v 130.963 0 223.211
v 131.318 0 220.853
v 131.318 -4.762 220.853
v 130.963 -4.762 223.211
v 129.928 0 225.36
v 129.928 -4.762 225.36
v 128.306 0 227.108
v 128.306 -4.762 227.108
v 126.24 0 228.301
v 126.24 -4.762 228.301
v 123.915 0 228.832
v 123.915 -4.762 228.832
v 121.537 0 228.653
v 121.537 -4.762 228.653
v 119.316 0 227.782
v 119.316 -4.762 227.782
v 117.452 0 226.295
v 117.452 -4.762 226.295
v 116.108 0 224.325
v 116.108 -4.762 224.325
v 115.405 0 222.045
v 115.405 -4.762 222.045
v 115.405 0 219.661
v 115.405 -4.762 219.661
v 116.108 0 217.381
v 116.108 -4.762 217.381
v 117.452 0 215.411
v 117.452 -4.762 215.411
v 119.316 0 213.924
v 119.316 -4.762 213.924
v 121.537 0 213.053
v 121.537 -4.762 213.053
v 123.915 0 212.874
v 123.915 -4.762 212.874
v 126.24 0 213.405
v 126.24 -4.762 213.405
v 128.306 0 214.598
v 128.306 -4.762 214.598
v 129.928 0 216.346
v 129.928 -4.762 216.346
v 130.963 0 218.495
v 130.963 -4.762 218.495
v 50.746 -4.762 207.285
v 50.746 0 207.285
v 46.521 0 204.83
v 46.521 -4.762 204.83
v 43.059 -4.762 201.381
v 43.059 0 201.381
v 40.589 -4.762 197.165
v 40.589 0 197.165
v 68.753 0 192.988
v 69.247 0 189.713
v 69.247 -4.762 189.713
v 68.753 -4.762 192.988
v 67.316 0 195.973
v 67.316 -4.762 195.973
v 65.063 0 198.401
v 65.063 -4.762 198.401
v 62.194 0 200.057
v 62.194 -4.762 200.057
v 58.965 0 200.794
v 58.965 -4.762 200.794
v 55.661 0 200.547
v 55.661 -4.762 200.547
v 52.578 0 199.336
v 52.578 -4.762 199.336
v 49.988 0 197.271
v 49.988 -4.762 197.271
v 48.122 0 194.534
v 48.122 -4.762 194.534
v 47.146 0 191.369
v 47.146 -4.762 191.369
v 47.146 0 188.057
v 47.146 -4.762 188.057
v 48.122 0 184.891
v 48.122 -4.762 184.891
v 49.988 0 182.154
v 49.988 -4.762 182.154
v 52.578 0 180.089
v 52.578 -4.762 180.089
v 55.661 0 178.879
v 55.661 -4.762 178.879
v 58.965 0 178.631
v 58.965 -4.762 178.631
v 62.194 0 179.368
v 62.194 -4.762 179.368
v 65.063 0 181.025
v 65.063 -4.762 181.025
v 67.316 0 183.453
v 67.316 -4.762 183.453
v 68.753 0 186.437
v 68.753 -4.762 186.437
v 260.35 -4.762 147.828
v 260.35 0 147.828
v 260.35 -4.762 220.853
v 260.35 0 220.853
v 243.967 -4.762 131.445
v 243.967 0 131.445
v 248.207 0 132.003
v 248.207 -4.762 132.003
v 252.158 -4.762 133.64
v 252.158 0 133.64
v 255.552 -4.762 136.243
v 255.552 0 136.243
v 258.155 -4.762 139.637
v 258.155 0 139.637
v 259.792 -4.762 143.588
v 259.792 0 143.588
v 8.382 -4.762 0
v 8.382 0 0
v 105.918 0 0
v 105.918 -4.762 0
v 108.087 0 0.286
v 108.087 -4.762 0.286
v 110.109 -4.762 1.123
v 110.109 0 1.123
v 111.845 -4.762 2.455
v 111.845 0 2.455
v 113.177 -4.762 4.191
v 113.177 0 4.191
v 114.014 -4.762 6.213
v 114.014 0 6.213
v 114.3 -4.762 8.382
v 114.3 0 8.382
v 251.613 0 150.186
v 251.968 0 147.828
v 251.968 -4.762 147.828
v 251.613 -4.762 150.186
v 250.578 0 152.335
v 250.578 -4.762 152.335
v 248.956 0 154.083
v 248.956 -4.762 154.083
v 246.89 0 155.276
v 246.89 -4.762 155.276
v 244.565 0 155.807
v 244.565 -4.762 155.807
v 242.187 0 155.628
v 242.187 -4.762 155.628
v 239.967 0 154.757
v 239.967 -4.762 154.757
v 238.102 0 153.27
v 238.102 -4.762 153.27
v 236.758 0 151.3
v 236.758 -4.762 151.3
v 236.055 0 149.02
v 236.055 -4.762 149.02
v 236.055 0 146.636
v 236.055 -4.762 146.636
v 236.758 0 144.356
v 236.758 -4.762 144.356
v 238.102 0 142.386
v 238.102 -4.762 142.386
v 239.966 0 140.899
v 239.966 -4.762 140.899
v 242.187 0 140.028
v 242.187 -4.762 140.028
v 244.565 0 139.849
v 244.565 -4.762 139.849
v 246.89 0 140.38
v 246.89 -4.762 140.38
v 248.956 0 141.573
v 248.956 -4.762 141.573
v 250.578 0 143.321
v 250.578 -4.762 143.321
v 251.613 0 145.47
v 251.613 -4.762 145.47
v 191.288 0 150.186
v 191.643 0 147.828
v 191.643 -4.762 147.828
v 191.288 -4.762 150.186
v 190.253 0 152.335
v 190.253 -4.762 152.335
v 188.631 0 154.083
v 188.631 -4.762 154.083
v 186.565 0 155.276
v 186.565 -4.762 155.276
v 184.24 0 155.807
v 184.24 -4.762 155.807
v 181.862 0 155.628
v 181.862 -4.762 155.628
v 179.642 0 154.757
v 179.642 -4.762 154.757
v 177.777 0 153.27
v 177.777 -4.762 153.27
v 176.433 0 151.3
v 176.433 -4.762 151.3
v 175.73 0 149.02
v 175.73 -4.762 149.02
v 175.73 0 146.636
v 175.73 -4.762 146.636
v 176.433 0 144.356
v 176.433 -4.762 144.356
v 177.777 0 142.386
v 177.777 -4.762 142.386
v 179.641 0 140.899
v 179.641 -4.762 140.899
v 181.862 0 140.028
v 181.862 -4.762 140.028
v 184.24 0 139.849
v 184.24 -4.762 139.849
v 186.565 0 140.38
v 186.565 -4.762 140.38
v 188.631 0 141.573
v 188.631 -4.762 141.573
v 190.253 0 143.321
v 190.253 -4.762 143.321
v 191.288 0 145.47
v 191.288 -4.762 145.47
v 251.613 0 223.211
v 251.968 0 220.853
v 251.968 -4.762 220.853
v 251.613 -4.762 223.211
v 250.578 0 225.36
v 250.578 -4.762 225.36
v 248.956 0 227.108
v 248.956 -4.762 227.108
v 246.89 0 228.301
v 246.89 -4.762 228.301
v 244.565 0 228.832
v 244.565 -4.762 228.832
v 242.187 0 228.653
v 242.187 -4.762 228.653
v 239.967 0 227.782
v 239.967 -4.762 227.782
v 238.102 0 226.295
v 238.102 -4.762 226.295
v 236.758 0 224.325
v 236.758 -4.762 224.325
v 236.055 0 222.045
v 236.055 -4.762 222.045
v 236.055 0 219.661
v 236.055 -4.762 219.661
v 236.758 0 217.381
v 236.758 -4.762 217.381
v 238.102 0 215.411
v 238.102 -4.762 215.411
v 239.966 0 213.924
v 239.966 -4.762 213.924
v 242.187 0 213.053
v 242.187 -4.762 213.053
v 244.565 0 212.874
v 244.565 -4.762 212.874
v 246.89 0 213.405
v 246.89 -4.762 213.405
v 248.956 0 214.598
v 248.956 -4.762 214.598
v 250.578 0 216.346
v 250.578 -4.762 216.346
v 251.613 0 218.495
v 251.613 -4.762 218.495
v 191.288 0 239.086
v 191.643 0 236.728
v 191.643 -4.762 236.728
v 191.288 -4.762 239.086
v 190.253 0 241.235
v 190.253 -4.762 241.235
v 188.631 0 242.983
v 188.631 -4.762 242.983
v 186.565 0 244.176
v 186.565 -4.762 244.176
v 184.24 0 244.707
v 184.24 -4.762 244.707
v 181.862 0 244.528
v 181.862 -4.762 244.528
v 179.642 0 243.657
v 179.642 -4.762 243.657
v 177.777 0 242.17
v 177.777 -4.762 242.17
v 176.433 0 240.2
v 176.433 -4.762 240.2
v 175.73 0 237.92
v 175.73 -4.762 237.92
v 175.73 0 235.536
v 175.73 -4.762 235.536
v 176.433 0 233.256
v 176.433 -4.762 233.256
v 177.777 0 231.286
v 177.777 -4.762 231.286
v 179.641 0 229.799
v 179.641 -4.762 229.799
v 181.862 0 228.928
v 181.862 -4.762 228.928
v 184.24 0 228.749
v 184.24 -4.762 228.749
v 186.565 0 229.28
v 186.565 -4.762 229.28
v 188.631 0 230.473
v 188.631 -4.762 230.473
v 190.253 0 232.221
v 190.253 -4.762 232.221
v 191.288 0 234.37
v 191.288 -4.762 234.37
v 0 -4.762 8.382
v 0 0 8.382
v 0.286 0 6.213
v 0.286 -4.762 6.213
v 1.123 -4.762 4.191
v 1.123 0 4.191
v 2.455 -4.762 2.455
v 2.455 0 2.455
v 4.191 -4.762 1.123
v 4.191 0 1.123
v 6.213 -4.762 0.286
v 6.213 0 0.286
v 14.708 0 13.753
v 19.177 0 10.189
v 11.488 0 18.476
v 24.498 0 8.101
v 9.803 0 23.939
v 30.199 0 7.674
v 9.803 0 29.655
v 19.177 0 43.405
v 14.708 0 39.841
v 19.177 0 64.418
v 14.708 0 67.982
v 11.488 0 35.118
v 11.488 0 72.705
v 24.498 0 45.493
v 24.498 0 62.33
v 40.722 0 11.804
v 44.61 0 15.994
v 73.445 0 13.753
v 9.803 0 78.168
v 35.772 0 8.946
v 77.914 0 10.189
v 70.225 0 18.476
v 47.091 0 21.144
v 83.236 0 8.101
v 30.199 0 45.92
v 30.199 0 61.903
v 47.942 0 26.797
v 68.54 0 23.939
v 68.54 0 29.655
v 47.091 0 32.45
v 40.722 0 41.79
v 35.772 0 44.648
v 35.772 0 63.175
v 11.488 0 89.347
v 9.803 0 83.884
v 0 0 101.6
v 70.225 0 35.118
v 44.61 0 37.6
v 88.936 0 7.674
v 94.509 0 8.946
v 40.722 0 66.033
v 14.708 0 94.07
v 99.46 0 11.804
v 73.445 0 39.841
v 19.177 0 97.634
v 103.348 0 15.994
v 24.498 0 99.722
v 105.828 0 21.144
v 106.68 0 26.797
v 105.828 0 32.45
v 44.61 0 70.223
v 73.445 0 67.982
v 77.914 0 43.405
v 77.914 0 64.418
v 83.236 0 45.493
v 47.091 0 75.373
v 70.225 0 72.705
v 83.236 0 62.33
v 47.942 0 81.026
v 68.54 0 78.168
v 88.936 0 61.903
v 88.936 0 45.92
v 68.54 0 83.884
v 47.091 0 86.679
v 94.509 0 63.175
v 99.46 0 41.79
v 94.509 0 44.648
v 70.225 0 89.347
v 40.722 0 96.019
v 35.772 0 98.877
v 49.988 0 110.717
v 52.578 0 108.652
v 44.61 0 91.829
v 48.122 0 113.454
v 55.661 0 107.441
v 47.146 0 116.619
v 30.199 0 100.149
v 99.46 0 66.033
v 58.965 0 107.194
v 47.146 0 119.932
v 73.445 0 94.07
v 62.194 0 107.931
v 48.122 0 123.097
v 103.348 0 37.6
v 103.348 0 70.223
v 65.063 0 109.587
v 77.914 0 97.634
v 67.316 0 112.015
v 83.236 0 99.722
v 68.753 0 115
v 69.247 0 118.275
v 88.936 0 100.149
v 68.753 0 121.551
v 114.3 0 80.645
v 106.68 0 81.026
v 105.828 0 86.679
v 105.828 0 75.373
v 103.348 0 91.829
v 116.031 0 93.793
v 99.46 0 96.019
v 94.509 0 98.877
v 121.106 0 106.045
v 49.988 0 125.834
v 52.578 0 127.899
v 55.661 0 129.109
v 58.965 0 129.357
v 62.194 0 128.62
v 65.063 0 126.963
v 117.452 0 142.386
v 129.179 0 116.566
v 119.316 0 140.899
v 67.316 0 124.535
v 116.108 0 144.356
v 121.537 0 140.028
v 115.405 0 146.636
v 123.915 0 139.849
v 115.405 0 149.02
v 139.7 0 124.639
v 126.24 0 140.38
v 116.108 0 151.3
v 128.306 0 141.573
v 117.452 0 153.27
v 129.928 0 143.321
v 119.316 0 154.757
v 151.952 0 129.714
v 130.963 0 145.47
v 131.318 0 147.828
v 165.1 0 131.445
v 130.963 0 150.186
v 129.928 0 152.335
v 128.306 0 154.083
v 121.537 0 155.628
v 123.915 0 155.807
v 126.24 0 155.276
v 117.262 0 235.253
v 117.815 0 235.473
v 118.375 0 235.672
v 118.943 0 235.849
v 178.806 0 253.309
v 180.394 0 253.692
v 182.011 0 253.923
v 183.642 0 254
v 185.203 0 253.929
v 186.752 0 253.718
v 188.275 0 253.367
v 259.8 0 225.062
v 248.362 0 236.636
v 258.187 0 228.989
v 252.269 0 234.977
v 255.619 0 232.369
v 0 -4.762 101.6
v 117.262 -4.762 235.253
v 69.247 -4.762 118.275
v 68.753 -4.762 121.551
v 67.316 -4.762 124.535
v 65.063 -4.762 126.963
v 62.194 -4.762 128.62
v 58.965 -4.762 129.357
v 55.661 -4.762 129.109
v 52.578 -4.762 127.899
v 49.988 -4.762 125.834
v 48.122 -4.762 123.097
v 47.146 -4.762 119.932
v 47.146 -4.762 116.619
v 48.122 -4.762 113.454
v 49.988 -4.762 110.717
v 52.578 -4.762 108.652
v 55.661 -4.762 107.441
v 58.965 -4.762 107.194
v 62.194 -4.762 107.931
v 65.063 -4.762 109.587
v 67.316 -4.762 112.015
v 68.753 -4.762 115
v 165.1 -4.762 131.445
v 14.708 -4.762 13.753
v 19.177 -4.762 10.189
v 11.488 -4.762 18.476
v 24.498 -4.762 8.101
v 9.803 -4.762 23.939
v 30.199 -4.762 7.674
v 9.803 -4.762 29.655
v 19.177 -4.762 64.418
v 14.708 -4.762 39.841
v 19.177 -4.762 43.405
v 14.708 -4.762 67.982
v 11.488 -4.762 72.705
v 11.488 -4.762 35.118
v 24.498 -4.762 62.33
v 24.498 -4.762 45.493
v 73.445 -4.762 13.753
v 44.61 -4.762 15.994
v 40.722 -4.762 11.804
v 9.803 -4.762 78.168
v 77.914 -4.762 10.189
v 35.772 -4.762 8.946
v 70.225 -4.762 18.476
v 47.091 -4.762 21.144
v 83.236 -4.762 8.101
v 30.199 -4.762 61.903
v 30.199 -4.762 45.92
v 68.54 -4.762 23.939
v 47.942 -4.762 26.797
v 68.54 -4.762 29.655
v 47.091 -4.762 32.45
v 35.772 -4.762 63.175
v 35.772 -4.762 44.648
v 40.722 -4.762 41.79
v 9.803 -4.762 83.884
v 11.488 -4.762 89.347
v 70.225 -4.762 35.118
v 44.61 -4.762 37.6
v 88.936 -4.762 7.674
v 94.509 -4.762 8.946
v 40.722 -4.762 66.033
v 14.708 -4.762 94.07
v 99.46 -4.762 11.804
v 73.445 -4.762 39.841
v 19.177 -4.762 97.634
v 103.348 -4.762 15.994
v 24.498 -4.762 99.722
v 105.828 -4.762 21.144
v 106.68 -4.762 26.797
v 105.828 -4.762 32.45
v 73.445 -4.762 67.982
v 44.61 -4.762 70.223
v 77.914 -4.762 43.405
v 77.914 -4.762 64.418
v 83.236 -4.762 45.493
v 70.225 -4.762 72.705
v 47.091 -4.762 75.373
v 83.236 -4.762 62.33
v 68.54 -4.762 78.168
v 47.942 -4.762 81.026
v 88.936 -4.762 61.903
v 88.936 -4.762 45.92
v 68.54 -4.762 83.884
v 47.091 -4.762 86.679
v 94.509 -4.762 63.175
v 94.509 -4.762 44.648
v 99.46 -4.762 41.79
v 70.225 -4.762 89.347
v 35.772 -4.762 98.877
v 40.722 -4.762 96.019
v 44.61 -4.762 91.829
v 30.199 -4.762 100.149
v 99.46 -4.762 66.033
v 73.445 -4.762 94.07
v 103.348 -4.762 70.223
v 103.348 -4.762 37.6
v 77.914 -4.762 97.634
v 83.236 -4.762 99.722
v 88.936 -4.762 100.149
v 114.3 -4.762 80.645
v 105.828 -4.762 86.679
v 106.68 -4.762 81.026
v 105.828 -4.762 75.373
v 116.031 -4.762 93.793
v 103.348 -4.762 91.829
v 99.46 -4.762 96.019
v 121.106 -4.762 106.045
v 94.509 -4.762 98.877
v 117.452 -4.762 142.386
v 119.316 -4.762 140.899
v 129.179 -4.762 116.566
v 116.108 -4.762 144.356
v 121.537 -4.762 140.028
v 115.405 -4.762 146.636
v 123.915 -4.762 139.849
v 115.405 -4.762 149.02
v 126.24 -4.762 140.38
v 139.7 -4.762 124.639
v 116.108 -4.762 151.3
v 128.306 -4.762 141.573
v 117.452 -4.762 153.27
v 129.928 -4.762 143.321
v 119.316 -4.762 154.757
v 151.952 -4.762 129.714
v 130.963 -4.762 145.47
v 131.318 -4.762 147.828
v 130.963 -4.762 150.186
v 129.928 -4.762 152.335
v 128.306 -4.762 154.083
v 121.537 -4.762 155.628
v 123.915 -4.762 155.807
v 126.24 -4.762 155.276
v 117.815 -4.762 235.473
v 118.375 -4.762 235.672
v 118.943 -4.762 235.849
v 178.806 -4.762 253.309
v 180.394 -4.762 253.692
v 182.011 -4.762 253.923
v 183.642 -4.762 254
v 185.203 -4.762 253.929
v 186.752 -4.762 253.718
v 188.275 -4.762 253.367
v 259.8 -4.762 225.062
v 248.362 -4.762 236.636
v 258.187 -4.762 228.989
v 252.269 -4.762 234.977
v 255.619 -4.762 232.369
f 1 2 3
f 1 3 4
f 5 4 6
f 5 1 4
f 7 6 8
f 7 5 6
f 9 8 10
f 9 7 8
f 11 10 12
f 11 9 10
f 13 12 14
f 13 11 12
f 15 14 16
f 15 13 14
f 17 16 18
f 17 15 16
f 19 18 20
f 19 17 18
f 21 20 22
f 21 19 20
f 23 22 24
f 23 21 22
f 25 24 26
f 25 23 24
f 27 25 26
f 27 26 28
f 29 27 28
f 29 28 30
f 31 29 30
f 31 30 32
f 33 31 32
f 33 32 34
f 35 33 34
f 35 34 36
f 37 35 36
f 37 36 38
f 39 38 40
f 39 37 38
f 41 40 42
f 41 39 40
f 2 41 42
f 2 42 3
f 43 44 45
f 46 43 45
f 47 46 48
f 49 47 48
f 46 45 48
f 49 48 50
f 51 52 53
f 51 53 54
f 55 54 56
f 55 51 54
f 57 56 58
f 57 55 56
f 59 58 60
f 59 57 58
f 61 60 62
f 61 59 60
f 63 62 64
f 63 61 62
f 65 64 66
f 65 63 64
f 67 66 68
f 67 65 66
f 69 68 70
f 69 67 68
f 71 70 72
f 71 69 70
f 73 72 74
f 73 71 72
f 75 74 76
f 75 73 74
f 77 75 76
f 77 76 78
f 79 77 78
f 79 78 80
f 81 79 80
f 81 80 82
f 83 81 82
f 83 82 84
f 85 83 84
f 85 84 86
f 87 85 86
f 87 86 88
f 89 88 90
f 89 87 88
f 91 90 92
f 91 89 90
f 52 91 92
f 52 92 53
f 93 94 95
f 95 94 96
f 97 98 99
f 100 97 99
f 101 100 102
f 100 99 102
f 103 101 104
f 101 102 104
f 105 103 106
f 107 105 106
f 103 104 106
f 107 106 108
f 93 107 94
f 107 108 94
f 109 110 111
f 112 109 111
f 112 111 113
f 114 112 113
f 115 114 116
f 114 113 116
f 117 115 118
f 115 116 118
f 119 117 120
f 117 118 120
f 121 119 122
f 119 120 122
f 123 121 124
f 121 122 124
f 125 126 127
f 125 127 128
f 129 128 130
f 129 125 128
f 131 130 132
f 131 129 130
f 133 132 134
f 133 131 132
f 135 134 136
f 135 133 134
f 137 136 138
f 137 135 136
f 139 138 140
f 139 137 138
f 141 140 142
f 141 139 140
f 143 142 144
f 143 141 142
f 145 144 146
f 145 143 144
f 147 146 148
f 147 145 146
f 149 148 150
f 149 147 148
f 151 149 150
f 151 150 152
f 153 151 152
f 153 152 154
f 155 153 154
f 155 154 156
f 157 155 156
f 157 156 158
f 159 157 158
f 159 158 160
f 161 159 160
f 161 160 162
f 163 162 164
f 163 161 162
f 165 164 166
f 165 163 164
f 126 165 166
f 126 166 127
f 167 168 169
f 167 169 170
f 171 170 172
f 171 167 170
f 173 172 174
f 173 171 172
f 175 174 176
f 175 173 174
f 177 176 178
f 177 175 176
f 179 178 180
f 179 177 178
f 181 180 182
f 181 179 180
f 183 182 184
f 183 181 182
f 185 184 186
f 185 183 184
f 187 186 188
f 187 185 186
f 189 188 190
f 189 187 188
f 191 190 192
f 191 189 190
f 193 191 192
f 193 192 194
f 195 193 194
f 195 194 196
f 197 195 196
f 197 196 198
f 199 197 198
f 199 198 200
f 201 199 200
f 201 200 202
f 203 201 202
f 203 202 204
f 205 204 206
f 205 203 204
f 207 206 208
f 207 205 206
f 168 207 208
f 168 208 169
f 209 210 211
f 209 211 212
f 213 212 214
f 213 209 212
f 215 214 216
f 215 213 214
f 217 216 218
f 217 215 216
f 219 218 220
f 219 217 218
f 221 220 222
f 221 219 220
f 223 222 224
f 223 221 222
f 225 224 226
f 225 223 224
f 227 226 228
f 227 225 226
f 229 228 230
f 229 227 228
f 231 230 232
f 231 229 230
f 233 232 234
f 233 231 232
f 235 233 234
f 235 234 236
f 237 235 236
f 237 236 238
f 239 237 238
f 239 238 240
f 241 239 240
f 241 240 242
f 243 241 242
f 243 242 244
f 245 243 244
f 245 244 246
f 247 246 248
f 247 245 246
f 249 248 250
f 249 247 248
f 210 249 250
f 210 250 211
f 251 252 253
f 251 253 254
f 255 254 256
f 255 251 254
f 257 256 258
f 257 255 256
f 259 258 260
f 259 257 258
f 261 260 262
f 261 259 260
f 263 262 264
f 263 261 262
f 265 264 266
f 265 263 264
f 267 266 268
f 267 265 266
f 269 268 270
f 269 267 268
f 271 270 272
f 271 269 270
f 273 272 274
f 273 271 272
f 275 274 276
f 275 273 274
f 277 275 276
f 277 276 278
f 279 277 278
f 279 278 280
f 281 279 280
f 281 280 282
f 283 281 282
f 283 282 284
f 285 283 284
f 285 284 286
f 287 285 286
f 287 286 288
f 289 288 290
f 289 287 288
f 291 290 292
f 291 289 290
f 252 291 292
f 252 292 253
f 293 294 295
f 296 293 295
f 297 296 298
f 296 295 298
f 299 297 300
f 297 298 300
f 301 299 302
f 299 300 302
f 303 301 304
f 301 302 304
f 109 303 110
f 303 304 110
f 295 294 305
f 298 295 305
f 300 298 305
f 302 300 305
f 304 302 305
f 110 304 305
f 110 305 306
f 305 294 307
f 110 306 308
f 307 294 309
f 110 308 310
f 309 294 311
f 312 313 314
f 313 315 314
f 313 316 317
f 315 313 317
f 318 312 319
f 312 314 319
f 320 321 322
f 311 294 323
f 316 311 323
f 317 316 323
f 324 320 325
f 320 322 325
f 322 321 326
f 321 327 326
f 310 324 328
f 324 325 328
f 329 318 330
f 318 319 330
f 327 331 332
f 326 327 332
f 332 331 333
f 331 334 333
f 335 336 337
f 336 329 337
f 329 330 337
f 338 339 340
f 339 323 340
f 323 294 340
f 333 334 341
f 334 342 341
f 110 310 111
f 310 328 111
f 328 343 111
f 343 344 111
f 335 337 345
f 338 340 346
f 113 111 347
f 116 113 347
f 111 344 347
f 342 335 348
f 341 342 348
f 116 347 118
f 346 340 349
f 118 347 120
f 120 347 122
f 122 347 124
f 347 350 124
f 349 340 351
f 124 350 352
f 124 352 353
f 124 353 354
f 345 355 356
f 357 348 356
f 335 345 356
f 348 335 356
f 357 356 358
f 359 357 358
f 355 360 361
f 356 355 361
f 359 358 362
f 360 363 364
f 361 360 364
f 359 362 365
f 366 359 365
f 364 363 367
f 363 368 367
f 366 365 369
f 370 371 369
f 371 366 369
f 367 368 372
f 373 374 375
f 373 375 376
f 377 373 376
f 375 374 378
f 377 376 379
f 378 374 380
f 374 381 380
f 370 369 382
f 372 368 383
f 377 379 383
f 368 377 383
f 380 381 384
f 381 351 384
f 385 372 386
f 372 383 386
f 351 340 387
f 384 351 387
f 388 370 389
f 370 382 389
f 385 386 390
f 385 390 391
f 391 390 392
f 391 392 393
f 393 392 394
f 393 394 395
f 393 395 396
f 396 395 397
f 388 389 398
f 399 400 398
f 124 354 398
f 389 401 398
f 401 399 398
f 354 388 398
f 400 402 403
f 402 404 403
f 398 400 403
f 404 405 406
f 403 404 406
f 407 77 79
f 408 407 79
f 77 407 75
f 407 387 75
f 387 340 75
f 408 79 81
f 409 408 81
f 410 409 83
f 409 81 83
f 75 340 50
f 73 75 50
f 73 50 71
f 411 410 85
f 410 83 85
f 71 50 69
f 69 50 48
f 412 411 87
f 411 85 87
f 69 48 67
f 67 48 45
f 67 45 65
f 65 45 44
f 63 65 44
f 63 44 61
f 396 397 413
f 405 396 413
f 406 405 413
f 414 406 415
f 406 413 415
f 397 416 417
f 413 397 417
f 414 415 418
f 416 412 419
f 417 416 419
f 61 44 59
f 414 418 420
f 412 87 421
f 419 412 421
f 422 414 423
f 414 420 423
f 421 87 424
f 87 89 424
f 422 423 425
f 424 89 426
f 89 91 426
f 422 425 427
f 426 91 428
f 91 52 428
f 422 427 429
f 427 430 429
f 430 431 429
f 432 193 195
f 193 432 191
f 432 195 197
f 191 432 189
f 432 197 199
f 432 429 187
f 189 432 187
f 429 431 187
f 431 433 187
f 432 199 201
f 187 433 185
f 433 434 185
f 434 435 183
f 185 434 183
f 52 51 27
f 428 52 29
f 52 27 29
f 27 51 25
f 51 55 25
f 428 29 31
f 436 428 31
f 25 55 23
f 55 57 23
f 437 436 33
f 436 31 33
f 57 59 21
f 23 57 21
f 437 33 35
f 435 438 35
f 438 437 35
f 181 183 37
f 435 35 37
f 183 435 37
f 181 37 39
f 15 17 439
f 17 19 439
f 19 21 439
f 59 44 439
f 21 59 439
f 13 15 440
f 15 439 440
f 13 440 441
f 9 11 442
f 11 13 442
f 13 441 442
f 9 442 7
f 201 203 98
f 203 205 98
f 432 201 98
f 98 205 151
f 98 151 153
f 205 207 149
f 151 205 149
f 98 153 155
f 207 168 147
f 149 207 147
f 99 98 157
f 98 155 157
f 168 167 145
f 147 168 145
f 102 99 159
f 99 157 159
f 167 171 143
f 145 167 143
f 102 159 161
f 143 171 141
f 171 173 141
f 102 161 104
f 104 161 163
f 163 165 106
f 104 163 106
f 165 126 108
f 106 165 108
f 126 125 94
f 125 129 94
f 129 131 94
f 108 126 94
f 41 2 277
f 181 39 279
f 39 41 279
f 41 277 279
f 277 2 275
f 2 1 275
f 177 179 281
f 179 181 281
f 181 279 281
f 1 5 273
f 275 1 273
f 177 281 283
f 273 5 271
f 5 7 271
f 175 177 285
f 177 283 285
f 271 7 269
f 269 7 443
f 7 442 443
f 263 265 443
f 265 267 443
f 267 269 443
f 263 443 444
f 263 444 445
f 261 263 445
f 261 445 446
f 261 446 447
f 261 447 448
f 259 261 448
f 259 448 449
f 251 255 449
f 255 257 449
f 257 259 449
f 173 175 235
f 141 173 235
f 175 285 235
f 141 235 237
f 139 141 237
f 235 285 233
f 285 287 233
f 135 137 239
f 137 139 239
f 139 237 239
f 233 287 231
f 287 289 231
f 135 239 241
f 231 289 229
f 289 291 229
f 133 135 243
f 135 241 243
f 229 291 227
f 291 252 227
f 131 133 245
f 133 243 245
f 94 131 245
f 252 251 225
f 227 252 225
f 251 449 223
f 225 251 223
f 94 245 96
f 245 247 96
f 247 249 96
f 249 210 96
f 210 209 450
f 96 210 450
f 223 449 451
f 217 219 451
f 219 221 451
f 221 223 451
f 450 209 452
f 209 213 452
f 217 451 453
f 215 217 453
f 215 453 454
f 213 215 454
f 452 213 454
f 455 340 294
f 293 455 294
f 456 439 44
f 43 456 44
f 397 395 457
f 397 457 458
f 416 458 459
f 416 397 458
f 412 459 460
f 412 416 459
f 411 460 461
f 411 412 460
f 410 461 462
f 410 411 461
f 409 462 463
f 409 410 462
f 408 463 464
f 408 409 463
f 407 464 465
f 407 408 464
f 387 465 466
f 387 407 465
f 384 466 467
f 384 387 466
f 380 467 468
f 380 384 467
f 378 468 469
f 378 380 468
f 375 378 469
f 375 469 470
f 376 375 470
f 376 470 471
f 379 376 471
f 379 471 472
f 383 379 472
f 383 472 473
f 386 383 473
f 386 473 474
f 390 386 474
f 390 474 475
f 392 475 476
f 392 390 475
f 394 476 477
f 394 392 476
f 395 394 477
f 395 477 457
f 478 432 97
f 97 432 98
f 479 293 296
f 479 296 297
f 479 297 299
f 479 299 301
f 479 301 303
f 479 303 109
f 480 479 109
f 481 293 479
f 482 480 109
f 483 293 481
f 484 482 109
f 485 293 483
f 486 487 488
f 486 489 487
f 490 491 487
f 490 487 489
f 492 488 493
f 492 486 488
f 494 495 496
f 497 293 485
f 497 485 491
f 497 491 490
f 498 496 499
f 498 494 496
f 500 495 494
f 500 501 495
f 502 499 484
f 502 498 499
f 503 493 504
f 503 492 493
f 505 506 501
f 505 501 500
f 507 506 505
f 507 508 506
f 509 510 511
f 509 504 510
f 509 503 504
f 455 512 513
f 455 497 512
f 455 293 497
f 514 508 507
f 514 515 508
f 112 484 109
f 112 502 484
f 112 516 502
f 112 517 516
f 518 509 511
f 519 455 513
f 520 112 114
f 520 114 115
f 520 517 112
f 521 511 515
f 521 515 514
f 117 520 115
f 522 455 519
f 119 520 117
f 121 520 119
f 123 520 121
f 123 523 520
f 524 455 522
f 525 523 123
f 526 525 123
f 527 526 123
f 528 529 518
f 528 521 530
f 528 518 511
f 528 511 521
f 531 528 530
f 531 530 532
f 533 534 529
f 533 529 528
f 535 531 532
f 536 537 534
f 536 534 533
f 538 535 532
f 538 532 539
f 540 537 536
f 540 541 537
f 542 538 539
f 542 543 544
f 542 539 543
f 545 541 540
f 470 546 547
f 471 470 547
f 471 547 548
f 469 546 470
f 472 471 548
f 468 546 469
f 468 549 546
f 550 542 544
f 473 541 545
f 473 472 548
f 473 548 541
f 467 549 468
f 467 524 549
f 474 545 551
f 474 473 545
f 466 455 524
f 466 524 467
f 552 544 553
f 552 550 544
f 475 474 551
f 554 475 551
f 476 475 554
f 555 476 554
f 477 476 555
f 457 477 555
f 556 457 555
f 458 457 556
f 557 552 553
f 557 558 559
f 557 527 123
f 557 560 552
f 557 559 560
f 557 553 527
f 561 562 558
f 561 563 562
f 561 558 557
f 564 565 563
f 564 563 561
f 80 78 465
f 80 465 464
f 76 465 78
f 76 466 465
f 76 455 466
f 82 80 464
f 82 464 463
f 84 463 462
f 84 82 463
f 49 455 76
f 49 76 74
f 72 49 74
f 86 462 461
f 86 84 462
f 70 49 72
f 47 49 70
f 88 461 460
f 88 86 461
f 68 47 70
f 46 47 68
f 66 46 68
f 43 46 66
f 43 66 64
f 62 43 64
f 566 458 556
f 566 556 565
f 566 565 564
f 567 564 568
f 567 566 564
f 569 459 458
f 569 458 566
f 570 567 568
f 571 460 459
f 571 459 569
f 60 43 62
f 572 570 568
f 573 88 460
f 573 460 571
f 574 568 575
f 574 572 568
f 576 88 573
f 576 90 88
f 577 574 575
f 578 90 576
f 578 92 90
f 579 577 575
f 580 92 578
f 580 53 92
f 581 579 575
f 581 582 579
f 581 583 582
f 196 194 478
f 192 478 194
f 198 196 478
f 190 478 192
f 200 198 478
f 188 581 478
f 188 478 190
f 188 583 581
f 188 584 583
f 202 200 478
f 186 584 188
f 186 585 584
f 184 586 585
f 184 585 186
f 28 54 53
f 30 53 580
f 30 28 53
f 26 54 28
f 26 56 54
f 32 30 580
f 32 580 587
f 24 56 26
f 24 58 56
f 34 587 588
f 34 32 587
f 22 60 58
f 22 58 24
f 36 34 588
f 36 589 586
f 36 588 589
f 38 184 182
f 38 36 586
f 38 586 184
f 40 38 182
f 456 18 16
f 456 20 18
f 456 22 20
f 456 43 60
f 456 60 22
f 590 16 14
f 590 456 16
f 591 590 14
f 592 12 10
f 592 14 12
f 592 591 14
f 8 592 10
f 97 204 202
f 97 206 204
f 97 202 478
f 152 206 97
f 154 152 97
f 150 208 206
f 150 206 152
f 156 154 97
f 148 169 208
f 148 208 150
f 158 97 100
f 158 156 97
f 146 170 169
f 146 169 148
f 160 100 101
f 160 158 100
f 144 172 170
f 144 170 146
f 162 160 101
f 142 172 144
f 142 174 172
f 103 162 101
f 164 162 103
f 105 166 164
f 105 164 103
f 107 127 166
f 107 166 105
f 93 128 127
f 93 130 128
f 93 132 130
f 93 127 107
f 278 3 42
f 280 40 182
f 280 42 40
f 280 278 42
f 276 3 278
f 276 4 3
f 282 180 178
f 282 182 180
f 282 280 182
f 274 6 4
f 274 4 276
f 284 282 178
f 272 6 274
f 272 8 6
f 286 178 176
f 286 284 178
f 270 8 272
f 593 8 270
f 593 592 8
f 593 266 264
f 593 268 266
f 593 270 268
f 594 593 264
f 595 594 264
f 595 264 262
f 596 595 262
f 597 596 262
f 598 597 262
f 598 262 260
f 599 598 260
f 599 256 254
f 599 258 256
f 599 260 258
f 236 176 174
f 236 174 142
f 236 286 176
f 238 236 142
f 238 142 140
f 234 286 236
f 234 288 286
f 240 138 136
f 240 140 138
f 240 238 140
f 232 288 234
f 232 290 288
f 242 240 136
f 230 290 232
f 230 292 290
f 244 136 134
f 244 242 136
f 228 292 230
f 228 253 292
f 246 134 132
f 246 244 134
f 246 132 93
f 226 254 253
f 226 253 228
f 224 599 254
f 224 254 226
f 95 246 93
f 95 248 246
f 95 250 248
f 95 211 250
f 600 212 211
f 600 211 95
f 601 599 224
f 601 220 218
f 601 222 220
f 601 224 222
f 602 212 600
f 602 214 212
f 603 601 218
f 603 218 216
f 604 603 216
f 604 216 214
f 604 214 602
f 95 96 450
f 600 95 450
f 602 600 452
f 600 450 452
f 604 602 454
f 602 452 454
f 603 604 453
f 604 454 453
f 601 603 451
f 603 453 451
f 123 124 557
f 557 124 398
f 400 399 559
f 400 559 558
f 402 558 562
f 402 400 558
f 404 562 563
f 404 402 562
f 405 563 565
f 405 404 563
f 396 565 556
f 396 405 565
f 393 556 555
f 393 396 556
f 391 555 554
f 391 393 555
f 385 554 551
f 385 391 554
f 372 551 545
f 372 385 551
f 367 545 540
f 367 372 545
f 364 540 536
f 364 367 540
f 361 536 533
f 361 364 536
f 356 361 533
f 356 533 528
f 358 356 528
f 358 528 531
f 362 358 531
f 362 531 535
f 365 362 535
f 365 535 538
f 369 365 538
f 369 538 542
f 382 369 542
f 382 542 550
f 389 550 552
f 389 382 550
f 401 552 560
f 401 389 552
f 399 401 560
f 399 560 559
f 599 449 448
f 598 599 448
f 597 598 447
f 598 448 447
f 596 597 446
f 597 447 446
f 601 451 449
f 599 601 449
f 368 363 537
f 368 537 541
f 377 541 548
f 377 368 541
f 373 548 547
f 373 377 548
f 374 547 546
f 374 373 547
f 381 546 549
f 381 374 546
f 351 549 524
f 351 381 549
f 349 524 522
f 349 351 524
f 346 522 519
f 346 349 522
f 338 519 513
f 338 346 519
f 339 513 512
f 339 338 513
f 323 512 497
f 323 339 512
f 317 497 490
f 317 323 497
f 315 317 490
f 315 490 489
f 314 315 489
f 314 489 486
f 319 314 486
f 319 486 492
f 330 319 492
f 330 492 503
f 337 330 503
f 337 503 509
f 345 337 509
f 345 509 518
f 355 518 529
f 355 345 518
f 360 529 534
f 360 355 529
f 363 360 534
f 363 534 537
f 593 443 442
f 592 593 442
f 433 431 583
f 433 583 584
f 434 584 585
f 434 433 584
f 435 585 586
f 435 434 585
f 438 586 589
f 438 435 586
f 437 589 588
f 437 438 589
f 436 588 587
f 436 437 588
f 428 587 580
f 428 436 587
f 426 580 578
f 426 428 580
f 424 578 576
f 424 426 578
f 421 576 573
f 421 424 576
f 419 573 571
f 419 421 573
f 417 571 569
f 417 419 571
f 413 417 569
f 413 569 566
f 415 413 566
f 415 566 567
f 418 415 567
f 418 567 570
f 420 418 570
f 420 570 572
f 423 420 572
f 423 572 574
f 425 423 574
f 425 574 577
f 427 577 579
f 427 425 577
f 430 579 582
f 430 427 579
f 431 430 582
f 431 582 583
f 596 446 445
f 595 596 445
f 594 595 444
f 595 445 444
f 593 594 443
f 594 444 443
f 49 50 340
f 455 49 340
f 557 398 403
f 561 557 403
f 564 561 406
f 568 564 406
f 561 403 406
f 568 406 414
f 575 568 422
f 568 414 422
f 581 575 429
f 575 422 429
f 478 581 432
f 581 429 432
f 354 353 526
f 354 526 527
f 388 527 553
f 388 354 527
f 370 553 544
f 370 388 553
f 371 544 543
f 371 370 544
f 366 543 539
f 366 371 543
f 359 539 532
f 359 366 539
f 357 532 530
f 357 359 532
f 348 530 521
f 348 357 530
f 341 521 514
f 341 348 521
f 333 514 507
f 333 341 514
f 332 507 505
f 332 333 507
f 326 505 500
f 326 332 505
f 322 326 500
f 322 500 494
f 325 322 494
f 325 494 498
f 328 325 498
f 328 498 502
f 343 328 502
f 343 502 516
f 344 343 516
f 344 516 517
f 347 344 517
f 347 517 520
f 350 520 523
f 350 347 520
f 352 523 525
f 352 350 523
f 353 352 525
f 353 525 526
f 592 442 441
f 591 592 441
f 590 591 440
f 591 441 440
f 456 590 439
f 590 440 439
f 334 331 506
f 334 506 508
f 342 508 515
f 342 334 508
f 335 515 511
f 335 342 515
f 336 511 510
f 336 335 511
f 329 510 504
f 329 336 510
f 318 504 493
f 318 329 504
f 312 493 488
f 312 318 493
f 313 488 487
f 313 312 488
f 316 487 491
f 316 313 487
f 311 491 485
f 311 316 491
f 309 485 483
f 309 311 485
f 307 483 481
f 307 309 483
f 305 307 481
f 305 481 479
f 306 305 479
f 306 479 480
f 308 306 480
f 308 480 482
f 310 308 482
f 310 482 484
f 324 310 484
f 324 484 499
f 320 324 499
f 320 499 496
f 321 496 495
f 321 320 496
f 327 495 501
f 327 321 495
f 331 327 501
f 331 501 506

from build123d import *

# Parameters (mm, degrees)
F0_R     = 19.177
F0_R_2   = 11.1125
F0_R_3   = 8.001
F1_DEPTH = 4.7625


with BuildPart() as f1:
    # F0 (on Front) → F1 (new body)
    with BuildSketch(Plane.XZ):
        with BuildLine():
            ThreePointArc((0, 8.382), (2.455031, 2.455031), (8.382, 0))
            Line((8.382, 0), (105.918, 0))
            ThreePointArc((105.918, 0), (111.844969, 2.455031), (114.3, 8.382))
            Line((114.3, 8.382), (114.3, 80.645))
            ThreePointArc((114.3, 80.645), (129.178976, 116.566024), (165.1, 131.445))
            Line((165.1, 131.445), (243.967, 131.445))
            ThreePointArc((243.967, 131.445), (255.55153, 136.24347), (260.35, 147.828))
            Line((260.35, 147.828), (260.35, 220.853))
            ThreePointArc((260.35, 220.853), (257.013104, 230.762685), (248.361737, 236.635553))
            Line((248.361737, 236.635553), (188.275211, 253.36697))
            ThreePointArc((188.275211, 253.36697), (185.980128, 253.841011), (183.642, 254))
            ThreePointArc((183.642, 254), (181.19937, 253.826408), (178.80584, 253.30912))
            Line((178.80584, 253.30912), (118.94312, 235.84916))
            ThreePointArc((118.94312, 235.84916), (118.094256, 235.575044), (117.262422, 235.252921))
            Line((117.262422, 235.252921), (50.745696, 207.285359))
            ThreePointArc((50.745696, 207.285359), (44.679286, 203.216493), (40.588503, 197.16484))
            Line((40.588503, 197.16484), (0, 101.6))
            Line((0, 101.6), (0, 8.382))
        make_face()
        with Locations((28.7655, 26.797)):
            Circle(F0_R, mode=Mode.SUBTRACT)
        with Locations((87.503, 26.797)):
            Circle(F0_R, mode=Mode.SUBTRACT)
        with Locations((28.7655, 81.026)):
            Circle(F0_R, mode=Mode.SUBTRACT)
        with Locations((58.13425, 118.275273)):
            Circle(F0_R_2, mode=Mode.SUBTRACT)
        with Locations((87.503, 81.026)):
            Circle(F0_R, mode=Mode.SUBTRACT)
        with Locations((58.13425, 189.712773)):
            Circle(F0_R_2, mode=Mode.SUBTRACT)
        with Locations((123.317, 147.828)):
            Circle(F0_R_3, mode=Mode.SUBTRACT)
        with Locations((123.317, 220.853)):
            Circle(F0_R_3, mode=Mode.SUBTRACT)
        with Locations((183.642, 147.828)):
            Circle(F0_R_3, mode=Mode.SUBTRACT)
        with Locations((243.967, 147.828)):
            Circle(F0_R_3, mode=Mode.SUBTRACT)
        with Locations((183.642, 236.728)):
            Circle(F0_R_3, mode=Mode.SUBTRACT)
        with Locations((243.967, 220.853)):
            Circle(F0_R_3, mode=Mode.SUBTRACT)
    extrude(amount=F1_DEPTH)


solid = f1.part
